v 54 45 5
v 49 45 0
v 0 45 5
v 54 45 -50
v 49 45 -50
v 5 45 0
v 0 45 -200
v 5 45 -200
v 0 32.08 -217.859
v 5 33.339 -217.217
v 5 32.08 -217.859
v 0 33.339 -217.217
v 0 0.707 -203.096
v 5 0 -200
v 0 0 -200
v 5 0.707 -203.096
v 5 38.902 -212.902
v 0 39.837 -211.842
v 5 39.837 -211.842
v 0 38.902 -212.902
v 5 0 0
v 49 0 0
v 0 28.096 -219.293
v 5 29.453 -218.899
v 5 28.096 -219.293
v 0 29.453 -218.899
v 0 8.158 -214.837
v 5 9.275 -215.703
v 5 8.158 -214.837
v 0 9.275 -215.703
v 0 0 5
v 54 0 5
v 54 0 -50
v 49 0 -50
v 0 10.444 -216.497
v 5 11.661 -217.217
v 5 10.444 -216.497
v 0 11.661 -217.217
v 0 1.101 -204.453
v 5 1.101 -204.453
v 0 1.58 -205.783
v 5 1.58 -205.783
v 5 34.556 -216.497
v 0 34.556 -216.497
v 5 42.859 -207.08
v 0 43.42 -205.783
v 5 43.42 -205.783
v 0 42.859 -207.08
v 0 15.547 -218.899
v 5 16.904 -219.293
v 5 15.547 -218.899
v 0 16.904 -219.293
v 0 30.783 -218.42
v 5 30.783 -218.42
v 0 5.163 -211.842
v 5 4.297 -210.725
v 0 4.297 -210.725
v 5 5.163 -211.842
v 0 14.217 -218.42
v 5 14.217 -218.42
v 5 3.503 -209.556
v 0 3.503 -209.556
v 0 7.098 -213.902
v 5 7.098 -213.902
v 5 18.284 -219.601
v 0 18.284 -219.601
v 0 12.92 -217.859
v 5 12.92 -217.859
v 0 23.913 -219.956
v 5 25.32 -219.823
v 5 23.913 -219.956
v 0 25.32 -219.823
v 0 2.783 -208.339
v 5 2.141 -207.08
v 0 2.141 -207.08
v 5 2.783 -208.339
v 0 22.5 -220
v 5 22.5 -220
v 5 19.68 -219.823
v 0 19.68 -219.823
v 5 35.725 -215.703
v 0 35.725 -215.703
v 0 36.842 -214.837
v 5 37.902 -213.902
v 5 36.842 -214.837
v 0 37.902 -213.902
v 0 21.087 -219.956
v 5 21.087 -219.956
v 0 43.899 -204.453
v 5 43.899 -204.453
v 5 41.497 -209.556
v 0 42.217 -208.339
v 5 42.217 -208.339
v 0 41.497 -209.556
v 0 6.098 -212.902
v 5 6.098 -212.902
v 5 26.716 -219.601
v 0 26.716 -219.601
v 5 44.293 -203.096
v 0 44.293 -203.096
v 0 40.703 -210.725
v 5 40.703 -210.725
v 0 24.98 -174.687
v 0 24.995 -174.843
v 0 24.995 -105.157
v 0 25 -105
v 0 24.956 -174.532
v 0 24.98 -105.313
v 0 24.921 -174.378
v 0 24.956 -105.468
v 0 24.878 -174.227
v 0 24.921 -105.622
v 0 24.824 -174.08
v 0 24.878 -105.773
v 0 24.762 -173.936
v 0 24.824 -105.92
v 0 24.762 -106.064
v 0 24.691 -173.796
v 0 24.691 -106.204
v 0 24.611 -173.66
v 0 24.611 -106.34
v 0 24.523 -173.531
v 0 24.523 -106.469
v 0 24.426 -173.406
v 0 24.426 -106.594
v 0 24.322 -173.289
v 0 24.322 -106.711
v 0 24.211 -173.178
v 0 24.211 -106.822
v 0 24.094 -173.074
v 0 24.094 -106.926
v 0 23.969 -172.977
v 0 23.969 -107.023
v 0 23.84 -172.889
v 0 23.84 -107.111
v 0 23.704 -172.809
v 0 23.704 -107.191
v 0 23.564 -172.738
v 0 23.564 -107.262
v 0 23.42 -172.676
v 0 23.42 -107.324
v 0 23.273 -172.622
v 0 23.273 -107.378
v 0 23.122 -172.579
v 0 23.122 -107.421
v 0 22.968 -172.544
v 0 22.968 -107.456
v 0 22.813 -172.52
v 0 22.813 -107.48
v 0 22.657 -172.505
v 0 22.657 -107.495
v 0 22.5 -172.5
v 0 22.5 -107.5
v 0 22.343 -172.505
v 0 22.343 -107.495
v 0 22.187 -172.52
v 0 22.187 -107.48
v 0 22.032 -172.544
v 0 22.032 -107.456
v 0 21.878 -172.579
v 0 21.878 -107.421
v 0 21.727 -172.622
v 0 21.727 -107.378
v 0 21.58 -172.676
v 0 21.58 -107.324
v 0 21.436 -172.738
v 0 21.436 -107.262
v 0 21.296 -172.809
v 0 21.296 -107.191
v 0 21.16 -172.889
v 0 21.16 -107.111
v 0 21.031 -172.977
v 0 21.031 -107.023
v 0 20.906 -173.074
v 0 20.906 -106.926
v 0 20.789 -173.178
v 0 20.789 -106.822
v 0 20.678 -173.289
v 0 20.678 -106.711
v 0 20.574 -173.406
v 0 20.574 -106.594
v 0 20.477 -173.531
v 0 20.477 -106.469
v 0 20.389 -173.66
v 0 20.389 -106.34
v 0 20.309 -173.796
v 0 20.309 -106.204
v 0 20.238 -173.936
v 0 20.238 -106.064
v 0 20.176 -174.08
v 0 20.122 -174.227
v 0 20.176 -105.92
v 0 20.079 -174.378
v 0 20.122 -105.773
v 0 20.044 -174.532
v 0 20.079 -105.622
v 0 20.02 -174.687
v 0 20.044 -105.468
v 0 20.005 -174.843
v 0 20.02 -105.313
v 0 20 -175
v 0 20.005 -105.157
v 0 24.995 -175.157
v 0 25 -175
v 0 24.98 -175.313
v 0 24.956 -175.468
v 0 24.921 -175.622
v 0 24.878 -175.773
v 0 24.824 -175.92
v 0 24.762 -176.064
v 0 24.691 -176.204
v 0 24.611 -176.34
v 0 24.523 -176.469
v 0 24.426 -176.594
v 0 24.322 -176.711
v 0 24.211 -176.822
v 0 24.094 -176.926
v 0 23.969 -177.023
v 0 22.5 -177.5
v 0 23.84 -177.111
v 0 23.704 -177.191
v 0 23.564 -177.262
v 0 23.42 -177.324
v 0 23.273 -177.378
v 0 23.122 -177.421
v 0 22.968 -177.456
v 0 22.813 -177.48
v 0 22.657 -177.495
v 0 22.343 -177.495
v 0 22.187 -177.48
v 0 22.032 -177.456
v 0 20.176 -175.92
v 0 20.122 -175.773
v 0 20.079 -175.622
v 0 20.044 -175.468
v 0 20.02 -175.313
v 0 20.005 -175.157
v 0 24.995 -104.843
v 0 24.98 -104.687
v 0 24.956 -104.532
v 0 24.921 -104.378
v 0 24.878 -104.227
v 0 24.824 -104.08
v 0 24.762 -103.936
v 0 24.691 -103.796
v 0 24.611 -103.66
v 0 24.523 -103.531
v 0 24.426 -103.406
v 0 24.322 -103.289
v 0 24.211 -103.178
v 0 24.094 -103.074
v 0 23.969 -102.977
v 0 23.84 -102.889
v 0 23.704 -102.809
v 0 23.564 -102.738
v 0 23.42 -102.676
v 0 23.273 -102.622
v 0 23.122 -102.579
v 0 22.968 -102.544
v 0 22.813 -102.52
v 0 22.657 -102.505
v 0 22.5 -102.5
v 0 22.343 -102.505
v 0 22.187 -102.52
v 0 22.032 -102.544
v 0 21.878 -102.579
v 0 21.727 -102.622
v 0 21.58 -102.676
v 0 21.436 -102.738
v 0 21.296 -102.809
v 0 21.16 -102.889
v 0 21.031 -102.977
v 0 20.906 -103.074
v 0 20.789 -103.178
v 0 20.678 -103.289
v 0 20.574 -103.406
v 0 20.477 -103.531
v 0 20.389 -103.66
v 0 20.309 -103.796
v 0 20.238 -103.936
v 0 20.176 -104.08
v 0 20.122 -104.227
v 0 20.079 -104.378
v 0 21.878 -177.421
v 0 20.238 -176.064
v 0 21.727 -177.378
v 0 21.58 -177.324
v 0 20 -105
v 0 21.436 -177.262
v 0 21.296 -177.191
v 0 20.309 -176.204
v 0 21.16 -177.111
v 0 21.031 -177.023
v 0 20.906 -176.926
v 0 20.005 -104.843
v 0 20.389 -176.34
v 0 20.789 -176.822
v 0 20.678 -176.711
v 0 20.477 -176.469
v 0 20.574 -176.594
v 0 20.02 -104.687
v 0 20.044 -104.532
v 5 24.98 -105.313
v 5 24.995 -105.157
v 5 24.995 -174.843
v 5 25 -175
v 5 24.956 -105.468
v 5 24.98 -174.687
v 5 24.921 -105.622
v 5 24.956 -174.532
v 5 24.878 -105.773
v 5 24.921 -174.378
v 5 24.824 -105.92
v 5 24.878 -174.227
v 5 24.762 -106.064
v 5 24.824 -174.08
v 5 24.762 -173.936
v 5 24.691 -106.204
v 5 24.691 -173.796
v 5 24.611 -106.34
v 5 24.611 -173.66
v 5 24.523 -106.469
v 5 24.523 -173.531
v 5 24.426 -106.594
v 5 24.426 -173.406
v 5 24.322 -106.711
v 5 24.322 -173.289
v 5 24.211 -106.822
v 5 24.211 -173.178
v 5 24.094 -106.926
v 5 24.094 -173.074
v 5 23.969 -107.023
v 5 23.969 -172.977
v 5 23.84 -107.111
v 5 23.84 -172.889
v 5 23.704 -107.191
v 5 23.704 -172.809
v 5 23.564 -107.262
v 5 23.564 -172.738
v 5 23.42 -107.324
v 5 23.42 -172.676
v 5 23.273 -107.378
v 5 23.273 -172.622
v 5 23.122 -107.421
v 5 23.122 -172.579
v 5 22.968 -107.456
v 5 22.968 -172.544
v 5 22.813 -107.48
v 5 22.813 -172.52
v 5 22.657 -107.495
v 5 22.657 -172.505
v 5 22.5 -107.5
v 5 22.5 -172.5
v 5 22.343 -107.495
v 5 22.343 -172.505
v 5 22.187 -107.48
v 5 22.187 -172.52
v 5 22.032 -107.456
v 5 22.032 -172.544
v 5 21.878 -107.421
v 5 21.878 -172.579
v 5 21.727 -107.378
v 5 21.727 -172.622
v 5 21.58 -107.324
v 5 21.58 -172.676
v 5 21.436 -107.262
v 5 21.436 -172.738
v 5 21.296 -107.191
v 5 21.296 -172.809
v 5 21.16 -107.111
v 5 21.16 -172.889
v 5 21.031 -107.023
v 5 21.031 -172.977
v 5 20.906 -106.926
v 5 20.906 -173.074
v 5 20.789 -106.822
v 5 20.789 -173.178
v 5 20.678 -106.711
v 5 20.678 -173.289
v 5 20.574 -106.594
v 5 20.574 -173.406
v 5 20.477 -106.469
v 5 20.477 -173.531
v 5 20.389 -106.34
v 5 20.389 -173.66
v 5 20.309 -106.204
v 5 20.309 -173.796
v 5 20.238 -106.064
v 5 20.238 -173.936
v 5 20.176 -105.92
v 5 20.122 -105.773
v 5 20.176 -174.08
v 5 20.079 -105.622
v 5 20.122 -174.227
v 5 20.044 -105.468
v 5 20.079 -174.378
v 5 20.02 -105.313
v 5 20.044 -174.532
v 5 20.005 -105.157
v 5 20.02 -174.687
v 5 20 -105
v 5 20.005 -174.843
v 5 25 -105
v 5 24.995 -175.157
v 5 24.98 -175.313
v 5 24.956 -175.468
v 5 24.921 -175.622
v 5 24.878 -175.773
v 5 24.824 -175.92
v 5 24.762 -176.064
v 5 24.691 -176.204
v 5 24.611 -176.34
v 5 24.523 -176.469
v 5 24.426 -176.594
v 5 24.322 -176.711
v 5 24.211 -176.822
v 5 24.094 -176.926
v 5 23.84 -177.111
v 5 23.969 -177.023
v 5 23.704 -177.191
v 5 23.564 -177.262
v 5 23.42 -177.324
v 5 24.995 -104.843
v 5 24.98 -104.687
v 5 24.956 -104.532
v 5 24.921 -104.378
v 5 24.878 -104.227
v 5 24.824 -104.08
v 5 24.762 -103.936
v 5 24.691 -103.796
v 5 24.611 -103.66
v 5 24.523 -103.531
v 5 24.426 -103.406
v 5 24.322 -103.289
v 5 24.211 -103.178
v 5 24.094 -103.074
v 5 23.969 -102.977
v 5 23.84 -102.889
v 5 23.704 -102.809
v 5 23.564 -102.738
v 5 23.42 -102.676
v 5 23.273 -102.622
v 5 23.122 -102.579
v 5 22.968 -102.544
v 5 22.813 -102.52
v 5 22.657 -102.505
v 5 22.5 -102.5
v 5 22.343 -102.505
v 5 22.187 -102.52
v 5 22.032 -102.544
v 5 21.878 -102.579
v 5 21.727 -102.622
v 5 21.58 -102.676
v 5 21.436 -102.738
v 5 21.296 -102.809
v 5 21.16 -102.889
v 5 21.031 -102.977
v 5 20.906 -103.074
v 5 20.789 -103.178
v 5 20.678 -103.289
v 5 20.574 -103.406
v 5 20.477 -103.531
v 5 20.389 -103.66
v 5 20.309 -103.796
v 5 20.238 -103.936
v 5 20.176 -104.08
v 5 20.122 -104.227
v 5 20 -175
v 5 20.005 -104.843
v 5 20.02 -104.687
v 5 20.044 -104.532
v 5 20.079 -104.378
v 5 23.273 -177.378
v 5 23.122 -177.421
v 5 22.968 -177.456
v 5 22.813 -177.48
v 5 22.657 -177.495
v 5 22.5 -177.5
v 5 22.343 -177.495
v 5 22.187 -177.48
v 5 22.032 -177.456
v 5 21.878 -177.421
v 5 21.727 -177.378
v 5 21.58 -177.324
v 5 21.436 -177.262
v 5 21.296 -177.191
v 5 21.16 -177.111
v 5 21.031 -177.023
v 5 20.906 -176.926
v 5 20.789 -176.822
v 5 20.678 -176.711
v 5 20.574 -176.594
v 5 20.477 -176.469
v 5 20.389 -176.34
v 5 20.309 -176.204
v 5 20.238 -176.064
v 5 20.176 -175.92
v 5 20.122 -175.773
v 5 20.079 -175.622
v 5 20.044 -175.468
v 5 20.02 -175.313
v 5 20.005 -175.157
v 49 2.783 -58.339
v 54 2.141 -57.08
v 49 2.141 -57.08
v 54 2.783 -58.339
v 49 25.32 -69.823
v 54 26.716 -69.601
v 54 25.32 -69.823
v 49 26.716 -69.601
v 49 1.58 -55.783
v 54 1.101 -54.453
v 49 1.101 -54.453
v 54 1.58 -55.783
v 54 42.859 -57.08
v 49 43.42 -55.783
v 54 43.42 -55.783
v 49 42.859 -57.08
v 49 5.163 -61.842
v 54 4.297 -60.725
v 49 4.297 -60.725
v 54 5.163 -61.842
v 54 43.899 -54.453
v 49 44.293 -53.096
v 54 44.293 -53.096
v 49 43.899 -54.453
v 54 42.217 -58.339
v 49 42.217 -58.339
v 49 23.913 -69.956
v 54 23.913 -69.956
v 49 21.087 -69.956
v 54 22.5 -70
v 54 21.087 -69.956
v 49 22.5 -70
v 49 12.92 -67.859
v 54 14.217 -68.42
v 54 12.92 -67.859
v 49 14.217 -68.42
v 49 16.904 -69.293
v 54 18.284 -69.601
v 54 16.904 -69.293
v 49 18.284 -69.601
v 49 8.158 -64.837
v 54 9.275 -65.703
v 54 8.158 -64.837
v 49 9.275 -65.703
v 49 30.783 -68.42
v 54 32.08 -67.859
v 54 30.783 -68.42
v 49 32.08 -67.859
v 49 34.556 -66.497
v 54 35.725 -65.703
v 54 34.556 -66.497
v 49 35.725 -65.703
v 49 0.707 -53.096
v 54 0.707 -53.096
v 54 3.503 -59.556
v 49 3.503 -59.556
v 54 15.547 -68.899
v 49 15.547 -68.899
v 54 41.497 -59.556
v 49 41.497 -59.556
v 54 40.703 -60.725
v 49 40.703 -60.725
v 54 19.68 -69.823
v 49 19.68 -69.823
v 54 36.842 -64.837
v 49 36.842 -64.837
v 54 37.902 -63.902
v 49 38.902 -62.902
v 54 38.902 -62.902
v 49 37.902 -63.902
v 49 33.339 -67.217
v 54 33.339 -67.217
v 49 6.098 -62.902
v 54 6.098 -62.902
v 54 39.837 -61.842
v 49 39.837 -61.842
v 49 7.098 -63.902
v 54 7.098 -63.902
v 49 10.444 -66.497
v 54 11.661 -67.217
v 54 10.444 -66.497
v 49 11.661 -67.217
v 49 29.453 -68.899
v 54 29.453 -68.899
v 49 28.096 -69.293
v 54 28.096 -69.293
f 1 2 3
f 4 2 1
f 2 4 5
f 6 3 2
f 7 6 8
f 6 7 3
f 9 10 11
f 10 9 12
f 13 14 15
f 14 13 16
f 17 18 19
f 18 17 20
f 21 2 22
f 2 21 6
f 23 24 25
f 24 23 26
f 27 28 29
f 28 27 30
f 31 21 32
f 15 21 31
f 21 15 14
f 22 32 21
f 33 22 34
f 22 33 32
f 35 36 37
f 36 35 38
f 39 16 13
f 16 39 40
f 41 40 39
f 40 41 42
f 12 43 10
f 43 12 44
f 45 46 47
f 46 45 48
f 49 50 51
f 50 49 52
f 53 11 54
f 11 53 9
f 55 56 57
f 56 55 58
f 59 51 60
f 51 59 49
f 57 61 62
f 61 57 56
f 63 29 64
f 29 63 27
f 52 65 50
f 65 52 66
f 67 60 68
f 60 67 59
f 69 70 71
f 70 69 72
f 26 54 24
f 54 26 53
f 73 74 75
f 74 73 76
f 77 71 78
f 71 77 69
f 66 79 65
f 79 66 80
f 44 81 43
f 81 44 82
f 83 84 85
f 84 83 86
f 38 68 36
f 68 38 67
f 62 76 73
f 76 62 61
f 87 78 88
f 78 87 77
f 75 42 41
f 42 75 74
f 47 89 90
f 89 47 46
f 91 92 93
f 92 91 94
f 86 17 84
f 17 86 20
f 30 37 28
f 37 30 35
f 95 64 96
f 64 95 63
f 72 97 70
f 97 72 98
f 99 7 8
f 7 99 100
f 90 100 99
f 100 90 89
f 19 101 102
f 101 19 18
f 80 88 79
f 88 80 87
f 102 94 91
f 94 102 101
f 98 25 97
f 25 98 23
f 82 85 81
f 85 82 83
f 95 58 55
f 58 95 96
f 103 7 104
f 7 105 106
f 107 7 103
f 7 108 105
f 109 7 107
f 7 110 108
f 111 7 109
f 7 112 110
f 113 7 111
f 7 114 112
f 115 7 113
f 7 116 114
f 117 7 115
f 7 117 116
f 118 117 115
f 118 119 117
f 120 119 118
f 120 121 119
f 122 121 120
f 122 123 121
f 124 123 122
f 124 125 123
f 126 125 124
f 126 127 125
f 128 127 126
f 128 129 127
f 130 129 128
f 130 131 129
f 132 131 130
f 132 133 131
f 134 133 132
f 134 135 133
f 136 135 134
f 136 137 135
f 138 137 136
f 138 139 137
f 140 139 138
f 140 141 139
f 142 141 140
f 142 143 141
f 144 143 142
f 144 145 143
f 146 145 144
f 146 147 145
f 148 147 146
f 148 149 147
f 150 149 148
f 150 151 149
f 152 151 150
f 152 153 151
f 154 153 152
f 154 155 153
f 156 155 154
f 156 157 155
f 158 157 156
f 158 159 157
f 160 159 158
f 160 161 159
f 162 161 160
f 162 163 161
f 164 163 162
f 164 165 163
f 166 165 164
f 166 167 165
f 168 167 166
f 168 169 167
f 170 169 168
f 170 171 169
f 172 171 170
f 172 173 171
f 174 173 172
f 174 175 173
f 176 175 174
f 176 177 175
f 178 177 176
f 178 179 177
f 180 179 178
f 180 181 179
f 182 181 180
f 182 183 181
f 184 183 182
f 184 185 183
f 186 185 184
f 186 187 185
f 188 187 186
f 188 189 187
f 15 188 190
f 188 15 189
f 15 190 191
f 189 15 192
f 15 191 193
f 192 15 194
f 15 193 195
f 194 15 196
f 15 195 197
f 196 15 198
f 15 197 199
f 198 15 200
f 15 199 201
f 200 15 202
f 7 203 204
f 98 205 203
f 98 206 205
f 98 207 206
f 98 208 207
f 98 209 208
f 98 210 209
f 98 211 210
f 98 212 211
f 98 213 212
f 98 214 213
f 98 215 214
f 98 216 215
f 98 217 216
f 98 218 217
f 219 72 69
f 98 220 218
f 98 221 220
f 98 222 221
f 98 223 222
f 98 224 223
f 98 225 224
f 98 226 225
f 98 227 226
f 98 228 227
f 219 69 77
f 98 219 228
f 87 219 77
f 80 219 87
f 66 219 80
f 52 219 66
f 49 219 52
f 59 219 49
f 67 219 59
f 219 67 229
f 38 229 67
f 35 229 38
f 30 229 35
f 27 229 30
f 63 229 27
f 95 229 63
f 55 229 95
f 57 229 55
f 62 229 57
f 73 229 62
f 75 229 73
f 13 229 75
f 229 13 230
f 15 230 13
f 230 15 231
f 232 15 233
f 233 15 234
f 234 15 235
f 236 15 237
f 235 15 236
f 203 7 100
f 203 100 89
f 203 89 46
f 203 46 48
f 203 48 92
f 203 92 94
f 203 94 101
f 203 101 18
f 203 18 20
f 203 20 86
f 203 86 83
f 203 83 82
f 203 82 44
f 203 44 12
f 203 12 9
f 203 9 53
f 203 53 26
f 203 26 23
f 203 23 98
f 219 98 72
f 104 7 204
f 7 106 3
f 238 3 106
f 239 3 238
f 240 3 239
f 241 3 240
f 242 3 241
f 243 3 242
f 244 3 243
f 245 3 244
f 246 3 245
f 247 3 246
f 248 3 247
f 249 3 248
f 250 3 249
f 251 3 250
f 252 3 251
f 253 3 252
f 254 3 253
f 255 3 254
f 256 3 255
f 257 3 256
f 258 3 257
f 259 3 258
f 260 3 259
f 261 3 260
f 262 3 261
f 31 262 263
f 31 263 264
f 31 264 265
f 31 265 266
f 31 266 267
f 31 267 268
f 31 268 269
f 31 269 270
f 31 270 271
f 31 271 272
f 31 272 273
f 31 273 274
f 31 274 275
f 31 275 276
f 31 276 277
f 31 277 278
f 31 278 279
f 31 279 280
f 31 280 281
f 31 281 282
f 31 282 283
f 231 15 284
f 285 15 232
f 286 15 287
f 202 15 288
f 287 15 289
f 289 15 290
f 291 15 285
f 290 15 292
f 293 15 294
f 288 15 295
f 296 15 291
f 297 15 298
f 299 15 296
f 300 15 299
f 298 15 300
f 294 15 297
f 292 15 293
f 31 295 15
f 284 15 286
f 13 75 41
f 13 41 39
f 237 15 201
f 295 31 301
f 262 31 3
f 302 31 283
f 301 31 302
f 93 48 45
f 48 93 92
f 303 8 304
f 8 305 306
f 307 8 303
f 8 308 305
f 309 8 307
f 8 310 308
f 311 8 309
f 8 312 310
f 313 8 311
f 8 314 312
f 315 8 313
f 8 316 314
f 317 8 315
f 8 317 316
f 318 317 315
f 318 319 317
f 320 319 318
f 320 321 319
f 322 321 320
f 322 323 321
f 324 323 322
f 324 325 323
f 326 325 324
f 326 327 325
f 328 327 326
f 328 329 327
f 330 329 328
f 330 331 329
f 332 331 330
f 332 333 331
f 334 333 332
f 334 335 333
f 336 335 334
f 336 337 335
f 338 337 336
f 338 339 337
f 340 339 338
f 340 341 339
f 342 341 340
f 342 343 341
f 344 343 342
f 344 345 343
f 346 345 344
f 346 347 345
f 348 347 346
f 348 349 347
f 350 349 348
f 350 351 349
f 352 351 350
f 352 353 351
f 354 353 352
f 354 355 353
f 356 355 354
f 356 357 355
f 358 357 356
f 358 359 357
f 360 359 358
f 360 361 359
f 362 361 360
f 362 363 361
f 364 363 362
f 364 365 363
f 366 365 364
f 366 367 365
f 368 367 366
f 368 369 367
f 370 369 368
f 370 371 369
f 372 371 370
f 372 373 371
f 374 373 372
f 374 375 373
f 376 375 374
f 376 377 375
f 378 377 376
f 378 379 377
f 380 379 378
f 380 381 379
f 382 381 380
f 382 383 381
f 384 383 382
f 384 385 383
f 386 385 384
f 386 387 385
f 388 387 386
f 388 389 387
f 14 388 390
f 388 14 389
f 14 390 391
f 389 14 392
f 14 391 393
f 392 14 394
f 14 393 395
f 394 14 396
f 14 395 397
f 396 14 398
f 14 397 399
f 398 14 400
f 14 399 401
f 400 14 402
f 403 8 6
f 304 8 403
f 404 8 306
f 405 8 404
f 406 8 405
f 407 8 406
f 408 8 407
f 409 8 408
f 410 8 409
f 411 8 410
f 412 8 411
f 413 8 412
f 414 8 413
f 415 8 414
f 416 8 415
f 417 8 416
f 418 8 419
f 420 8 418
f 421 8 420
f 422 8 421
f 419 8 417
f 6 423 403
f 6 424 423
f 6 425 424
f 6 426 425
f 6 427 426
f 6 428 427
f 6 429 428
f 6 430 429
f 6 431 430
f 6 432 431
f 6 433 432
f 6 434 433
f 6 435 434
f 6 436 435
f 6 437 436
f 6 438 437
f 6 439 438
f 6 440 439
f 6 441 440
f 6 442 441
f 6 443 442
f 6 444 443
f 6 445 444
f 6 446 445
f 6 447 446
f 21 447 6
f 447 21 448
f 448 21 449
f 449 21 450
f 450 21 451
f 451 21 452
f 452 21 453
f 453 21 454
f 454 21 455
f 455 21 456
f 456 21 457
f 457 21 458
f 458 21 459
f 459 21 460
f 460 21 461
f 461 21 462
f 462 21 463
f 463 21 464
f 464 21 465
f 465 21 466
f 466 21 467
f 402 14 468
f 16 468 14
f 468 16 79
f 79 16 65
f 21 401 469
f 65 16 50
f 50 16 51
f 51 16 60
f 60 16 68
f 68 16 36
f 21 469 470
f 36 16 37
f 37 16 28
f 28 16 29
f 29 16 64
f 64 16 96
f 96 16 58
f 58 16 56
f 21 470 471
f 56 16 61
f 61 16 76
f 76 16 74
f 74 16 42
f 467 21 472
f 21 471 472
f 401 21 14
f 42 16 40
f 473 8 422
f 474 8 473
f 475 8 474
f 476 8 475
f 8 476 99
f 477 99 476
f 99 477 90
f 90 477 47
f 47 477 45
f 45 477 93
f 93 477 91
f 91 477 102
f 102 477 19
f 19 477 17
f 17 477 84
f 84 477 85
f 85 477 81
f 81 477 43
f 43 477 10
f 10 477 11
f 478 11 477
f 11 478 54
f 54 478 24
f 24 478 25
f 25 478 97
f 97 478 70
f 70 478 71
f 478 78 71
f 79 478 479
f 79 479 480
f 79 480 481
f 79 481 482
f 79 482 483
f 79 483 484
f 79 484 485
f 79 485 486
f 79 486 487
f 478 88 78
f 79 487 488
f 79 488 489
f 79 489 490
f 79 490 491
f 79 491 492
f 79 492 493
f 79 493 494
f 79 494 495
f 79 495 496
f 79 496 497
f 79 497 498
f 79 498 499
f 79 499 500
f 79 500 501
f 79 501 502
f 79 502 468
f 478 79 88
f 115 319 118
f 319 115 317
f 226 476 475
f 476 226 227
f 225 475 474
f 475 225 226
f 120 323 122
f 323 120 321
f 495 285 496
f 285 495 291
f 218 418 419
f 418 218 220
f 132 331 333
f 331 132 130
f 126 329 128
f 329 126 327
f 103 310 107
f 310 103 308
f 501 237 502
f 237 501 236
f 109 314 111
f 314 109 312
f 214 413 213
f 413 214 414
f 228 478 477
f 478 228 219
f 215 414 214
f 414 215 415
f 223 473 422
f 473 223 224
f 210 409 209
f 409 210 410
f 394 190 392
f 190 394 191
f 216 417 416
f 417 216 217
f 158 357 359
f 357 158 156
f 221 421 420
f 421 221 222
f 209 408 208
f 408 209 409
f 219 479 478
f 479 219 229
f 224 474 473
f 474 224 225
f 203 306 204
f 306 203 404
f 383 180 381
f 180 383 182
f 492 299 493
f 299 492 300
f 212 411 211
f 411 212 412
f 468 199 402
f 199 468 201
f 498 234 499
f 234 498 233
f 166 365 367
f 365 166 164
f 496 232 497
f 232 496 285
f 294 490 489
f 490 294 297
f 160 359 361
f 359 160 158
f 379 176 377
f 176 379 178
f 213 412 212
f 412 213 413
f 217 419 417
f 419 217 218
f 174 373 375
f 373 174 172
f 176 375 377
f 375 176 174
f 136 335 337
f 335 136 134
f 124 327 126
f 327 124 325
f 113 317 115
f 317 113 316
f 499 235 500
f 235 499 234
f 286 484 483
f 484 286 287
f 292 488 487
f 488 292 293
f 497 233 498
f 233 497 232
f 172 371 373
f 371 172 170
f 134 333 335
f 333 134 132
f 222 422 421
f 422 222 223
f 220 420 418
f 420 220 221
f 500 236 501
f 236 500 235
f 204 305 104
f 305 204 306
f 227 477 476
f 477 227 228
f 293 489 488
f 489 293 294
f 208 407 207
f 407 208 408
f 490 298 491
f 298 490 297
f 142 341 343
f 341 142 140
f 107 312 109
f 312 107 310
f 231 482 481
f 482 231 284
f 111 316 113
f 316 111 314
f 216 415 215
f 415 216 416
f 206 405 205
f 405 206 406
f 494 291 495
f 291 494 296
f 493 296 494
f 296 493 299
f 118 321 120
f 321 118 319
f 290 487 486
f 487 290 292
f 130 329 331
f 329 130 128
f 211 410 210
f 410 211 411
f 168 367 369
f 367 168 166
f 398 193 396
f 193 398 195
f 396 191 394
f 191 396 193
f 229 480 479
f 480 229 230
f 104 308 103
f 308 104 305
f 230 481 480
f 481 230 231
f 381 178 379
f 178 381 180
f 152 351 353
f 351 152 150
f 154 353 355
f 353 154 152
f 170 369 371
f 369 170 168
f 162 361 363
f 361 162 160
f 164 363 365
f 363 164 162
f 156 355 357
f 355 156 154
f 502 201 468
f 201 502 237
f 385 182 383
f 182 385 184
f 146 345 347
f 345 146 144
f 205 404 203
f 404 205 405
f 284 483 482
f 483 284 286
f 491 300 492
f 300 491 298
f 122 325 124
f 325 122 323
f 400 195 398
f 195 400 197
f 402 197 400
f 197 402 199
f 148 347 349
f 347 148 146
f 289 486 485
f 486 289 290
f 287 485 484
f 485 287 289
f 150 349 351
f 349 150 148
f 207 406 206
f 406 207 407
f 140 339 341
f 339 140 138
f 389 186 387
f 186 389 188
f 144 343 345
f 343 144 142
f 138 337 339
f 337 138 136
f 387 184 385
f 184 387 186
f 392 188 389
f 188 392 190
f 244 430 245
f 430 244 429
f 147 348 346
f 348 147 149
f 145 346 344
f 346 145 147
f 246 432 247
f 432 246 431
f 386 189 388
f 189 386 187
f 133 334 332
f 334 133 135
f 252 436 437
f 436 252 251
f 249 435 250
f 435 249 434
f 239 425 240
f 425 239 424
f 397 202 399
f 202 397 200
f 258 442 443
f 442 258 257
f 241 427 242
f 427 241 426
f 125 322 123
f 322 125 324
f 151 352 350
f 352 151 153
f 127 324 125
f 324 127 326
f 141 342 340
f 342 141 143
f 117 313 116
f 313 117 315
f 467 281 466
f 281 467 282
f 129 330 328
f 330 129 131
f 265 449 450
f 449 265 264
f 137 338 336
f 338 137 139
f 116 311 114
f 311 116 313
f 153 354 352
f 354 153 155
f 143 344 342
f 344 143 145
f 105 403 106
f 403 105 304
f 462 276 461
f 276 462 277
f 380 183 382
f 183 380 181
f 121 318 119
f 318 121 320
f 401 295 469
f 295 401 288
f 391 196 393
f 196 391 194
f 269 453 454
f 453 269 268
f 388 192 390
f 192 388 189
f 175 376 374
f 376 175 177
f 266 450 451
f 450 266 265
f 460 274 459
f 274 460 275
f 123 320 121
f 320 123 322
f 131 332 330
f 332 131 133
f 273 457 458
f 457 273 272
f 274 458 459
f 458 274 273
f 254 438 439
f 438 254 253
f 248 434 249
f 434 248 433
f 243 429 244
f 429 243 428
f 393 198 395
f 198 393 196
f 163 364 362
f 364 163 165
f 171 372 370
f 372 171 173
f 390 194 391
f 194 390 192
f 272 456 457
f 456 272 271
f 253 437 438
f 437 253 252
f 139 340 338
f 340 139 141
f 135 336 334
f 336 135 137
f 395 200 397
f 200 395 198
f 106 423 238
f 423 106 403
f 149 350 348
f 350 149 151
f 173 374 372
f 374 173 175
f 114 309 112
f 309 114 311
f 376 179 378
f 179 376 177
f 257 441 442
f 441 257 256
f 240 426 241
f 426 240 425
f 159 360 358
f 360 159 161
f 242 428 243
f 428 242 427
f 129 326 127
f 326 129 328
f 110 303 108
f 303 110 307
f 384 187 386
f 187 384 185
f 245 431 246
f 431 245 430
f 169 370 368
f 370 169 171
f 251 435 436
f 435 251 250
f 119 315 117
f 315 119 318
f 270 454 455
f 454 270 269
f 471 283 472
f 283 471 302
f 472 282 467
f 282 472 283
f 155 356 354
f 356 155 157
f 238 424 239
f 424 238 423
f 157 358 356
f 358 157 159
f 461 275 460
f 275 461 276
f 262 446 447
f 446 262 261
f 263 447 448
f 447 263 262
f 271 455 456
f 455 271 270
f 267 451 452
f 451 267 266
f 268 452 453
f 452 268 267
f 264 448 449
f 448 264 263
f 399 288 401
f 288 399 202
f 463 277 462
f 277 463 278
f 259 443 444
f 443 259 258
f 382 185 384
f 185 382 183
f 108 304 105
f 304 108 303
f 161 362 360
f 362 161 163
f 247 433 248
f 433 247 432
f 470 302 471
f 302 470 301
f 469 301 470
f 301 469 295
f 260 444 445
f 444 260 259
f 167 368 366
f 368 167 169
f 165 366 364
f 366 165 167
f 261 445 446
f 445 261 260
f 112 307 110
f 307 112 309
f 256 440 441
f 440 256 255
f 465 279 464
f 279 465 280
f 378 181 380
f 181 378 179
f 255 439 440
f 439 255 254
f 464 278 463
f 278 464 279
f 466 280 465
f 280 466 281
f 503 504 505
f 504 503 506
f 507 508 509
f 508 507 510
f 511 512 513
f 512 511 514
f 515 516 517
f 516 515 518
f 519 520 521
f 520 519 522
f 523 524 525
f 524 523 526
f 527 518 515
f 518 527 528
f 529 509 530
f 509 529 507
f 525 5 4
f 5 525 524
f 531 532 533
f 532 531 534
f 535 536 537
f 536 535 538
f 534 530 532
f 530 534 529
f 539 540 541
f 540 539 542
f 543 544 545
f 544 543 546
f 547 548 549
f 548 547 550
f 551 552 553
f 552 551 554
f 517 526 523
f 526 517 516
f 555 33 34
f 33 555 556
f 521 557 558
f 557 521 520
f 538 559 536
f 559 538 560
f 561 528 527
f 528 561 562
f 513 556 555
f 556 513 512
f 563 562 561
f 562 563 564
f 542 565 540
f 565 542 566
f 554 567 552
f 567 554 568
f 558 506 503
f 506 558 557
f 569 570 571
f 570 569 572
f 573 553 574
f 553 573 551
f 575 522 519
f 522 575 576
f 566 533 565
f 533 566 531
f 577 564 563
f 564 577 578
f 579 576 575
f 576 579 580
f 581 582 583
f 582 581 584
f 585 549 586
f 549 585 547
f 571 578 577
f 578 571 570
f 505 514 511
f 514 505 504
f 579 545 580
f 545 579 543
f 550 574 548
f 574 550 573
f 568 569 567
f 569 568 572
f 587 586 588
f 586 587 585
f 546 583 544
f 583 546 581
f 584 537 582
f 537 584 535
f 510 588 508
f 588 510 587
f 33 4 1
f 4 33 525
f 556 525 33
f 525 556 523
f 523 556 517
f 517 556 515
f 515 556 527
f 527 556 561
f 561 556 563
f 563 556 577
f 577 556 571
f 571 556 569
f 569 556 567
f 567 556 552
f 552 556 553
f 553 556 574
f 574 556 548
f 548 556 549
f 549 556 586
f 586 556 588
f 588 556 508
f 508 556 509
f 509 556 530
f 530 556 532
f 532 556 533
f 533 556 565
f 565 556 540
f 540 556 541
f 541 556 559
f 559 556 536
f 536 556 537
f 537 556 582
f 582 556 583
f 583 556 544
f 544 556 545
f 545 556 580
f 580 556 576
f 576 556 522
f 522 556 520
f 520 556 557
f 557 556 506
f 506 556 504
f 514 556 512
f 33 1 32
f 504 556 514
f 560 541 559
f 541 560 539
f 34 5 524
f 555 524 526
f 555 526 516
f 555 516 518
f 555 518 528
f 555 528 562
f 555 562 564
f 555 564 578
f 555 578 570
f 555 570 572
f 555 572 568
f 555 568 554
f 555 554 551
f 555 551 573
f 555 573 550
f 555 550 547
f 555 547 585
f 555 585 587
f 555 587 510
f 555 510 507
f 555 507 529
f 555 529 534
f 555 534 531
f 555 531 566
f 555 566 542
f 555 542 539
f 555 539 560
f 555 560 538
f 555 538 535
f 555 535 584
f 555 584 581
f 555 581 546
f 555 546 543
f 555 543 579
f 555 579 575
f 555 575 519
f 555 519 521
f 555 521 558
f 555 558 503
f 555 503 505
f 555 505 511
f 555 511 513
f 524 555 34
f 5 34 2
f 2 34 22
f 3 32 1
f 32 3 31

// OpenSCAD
//simple wall mount hook with rounded tops

$fn=100;
// overall width of the hook mount
length=45;        
front_hook_height=50;
back_hook_height=200;
// thickness the walls of the hook and base
thickness=5;
// adjust to make the hook base larger or smaller; add double thickness for precision fits!
base_depth=54;        


// hook base
cube([base_depth,length,thickness]);

difference() {
    hull() {
    // top of back hook circle        
            rotate([0,90,0]) {
                translate([back_hook_height-(thickness/2),length/2,0]) cylinder(d=length,h=thickness);
            }
            
    // back of hook
            rotate([0,90,0]) {
                   cube([back_hook_height,length,thickness]);
            }
        }
    // screw holes        
            rotate([0,90,0]) {
                #translate([(length/2) + (back_hook_height*.75) + (thickness/2),length/2,-1*(thickness)]) cylinder(d=5,h=thickness*5);
            }
            rotate([0,90,0]) {
                #translate([(length/2) + (back_hook_height*.40) + (thickness/2),length/2,-1*(thickness)]) cylinder(d=5,h=thickness*5);
            }
            
    // cube to cut excess circle from bottom
    #translate([0,0,thickness]) cube([base_depth, length,length]);
}


difference() {
// front of hook
    hull() {
        rotate([0,90,0]) {
            #translate([front_hook_height-(thickness/2),length/2,base_depth-thickness]) cylinder(d=length,h=thickness);
        }
        rotate([0,90,0]) {
            translate([0,0,base_depth-thickness]) cube([front_hook_height,length,thickness]);
        }
    }
// cube to cut excess circle from bottom
    #translate([0,0,thickness]) cube([base_depth, length,length]);

}
